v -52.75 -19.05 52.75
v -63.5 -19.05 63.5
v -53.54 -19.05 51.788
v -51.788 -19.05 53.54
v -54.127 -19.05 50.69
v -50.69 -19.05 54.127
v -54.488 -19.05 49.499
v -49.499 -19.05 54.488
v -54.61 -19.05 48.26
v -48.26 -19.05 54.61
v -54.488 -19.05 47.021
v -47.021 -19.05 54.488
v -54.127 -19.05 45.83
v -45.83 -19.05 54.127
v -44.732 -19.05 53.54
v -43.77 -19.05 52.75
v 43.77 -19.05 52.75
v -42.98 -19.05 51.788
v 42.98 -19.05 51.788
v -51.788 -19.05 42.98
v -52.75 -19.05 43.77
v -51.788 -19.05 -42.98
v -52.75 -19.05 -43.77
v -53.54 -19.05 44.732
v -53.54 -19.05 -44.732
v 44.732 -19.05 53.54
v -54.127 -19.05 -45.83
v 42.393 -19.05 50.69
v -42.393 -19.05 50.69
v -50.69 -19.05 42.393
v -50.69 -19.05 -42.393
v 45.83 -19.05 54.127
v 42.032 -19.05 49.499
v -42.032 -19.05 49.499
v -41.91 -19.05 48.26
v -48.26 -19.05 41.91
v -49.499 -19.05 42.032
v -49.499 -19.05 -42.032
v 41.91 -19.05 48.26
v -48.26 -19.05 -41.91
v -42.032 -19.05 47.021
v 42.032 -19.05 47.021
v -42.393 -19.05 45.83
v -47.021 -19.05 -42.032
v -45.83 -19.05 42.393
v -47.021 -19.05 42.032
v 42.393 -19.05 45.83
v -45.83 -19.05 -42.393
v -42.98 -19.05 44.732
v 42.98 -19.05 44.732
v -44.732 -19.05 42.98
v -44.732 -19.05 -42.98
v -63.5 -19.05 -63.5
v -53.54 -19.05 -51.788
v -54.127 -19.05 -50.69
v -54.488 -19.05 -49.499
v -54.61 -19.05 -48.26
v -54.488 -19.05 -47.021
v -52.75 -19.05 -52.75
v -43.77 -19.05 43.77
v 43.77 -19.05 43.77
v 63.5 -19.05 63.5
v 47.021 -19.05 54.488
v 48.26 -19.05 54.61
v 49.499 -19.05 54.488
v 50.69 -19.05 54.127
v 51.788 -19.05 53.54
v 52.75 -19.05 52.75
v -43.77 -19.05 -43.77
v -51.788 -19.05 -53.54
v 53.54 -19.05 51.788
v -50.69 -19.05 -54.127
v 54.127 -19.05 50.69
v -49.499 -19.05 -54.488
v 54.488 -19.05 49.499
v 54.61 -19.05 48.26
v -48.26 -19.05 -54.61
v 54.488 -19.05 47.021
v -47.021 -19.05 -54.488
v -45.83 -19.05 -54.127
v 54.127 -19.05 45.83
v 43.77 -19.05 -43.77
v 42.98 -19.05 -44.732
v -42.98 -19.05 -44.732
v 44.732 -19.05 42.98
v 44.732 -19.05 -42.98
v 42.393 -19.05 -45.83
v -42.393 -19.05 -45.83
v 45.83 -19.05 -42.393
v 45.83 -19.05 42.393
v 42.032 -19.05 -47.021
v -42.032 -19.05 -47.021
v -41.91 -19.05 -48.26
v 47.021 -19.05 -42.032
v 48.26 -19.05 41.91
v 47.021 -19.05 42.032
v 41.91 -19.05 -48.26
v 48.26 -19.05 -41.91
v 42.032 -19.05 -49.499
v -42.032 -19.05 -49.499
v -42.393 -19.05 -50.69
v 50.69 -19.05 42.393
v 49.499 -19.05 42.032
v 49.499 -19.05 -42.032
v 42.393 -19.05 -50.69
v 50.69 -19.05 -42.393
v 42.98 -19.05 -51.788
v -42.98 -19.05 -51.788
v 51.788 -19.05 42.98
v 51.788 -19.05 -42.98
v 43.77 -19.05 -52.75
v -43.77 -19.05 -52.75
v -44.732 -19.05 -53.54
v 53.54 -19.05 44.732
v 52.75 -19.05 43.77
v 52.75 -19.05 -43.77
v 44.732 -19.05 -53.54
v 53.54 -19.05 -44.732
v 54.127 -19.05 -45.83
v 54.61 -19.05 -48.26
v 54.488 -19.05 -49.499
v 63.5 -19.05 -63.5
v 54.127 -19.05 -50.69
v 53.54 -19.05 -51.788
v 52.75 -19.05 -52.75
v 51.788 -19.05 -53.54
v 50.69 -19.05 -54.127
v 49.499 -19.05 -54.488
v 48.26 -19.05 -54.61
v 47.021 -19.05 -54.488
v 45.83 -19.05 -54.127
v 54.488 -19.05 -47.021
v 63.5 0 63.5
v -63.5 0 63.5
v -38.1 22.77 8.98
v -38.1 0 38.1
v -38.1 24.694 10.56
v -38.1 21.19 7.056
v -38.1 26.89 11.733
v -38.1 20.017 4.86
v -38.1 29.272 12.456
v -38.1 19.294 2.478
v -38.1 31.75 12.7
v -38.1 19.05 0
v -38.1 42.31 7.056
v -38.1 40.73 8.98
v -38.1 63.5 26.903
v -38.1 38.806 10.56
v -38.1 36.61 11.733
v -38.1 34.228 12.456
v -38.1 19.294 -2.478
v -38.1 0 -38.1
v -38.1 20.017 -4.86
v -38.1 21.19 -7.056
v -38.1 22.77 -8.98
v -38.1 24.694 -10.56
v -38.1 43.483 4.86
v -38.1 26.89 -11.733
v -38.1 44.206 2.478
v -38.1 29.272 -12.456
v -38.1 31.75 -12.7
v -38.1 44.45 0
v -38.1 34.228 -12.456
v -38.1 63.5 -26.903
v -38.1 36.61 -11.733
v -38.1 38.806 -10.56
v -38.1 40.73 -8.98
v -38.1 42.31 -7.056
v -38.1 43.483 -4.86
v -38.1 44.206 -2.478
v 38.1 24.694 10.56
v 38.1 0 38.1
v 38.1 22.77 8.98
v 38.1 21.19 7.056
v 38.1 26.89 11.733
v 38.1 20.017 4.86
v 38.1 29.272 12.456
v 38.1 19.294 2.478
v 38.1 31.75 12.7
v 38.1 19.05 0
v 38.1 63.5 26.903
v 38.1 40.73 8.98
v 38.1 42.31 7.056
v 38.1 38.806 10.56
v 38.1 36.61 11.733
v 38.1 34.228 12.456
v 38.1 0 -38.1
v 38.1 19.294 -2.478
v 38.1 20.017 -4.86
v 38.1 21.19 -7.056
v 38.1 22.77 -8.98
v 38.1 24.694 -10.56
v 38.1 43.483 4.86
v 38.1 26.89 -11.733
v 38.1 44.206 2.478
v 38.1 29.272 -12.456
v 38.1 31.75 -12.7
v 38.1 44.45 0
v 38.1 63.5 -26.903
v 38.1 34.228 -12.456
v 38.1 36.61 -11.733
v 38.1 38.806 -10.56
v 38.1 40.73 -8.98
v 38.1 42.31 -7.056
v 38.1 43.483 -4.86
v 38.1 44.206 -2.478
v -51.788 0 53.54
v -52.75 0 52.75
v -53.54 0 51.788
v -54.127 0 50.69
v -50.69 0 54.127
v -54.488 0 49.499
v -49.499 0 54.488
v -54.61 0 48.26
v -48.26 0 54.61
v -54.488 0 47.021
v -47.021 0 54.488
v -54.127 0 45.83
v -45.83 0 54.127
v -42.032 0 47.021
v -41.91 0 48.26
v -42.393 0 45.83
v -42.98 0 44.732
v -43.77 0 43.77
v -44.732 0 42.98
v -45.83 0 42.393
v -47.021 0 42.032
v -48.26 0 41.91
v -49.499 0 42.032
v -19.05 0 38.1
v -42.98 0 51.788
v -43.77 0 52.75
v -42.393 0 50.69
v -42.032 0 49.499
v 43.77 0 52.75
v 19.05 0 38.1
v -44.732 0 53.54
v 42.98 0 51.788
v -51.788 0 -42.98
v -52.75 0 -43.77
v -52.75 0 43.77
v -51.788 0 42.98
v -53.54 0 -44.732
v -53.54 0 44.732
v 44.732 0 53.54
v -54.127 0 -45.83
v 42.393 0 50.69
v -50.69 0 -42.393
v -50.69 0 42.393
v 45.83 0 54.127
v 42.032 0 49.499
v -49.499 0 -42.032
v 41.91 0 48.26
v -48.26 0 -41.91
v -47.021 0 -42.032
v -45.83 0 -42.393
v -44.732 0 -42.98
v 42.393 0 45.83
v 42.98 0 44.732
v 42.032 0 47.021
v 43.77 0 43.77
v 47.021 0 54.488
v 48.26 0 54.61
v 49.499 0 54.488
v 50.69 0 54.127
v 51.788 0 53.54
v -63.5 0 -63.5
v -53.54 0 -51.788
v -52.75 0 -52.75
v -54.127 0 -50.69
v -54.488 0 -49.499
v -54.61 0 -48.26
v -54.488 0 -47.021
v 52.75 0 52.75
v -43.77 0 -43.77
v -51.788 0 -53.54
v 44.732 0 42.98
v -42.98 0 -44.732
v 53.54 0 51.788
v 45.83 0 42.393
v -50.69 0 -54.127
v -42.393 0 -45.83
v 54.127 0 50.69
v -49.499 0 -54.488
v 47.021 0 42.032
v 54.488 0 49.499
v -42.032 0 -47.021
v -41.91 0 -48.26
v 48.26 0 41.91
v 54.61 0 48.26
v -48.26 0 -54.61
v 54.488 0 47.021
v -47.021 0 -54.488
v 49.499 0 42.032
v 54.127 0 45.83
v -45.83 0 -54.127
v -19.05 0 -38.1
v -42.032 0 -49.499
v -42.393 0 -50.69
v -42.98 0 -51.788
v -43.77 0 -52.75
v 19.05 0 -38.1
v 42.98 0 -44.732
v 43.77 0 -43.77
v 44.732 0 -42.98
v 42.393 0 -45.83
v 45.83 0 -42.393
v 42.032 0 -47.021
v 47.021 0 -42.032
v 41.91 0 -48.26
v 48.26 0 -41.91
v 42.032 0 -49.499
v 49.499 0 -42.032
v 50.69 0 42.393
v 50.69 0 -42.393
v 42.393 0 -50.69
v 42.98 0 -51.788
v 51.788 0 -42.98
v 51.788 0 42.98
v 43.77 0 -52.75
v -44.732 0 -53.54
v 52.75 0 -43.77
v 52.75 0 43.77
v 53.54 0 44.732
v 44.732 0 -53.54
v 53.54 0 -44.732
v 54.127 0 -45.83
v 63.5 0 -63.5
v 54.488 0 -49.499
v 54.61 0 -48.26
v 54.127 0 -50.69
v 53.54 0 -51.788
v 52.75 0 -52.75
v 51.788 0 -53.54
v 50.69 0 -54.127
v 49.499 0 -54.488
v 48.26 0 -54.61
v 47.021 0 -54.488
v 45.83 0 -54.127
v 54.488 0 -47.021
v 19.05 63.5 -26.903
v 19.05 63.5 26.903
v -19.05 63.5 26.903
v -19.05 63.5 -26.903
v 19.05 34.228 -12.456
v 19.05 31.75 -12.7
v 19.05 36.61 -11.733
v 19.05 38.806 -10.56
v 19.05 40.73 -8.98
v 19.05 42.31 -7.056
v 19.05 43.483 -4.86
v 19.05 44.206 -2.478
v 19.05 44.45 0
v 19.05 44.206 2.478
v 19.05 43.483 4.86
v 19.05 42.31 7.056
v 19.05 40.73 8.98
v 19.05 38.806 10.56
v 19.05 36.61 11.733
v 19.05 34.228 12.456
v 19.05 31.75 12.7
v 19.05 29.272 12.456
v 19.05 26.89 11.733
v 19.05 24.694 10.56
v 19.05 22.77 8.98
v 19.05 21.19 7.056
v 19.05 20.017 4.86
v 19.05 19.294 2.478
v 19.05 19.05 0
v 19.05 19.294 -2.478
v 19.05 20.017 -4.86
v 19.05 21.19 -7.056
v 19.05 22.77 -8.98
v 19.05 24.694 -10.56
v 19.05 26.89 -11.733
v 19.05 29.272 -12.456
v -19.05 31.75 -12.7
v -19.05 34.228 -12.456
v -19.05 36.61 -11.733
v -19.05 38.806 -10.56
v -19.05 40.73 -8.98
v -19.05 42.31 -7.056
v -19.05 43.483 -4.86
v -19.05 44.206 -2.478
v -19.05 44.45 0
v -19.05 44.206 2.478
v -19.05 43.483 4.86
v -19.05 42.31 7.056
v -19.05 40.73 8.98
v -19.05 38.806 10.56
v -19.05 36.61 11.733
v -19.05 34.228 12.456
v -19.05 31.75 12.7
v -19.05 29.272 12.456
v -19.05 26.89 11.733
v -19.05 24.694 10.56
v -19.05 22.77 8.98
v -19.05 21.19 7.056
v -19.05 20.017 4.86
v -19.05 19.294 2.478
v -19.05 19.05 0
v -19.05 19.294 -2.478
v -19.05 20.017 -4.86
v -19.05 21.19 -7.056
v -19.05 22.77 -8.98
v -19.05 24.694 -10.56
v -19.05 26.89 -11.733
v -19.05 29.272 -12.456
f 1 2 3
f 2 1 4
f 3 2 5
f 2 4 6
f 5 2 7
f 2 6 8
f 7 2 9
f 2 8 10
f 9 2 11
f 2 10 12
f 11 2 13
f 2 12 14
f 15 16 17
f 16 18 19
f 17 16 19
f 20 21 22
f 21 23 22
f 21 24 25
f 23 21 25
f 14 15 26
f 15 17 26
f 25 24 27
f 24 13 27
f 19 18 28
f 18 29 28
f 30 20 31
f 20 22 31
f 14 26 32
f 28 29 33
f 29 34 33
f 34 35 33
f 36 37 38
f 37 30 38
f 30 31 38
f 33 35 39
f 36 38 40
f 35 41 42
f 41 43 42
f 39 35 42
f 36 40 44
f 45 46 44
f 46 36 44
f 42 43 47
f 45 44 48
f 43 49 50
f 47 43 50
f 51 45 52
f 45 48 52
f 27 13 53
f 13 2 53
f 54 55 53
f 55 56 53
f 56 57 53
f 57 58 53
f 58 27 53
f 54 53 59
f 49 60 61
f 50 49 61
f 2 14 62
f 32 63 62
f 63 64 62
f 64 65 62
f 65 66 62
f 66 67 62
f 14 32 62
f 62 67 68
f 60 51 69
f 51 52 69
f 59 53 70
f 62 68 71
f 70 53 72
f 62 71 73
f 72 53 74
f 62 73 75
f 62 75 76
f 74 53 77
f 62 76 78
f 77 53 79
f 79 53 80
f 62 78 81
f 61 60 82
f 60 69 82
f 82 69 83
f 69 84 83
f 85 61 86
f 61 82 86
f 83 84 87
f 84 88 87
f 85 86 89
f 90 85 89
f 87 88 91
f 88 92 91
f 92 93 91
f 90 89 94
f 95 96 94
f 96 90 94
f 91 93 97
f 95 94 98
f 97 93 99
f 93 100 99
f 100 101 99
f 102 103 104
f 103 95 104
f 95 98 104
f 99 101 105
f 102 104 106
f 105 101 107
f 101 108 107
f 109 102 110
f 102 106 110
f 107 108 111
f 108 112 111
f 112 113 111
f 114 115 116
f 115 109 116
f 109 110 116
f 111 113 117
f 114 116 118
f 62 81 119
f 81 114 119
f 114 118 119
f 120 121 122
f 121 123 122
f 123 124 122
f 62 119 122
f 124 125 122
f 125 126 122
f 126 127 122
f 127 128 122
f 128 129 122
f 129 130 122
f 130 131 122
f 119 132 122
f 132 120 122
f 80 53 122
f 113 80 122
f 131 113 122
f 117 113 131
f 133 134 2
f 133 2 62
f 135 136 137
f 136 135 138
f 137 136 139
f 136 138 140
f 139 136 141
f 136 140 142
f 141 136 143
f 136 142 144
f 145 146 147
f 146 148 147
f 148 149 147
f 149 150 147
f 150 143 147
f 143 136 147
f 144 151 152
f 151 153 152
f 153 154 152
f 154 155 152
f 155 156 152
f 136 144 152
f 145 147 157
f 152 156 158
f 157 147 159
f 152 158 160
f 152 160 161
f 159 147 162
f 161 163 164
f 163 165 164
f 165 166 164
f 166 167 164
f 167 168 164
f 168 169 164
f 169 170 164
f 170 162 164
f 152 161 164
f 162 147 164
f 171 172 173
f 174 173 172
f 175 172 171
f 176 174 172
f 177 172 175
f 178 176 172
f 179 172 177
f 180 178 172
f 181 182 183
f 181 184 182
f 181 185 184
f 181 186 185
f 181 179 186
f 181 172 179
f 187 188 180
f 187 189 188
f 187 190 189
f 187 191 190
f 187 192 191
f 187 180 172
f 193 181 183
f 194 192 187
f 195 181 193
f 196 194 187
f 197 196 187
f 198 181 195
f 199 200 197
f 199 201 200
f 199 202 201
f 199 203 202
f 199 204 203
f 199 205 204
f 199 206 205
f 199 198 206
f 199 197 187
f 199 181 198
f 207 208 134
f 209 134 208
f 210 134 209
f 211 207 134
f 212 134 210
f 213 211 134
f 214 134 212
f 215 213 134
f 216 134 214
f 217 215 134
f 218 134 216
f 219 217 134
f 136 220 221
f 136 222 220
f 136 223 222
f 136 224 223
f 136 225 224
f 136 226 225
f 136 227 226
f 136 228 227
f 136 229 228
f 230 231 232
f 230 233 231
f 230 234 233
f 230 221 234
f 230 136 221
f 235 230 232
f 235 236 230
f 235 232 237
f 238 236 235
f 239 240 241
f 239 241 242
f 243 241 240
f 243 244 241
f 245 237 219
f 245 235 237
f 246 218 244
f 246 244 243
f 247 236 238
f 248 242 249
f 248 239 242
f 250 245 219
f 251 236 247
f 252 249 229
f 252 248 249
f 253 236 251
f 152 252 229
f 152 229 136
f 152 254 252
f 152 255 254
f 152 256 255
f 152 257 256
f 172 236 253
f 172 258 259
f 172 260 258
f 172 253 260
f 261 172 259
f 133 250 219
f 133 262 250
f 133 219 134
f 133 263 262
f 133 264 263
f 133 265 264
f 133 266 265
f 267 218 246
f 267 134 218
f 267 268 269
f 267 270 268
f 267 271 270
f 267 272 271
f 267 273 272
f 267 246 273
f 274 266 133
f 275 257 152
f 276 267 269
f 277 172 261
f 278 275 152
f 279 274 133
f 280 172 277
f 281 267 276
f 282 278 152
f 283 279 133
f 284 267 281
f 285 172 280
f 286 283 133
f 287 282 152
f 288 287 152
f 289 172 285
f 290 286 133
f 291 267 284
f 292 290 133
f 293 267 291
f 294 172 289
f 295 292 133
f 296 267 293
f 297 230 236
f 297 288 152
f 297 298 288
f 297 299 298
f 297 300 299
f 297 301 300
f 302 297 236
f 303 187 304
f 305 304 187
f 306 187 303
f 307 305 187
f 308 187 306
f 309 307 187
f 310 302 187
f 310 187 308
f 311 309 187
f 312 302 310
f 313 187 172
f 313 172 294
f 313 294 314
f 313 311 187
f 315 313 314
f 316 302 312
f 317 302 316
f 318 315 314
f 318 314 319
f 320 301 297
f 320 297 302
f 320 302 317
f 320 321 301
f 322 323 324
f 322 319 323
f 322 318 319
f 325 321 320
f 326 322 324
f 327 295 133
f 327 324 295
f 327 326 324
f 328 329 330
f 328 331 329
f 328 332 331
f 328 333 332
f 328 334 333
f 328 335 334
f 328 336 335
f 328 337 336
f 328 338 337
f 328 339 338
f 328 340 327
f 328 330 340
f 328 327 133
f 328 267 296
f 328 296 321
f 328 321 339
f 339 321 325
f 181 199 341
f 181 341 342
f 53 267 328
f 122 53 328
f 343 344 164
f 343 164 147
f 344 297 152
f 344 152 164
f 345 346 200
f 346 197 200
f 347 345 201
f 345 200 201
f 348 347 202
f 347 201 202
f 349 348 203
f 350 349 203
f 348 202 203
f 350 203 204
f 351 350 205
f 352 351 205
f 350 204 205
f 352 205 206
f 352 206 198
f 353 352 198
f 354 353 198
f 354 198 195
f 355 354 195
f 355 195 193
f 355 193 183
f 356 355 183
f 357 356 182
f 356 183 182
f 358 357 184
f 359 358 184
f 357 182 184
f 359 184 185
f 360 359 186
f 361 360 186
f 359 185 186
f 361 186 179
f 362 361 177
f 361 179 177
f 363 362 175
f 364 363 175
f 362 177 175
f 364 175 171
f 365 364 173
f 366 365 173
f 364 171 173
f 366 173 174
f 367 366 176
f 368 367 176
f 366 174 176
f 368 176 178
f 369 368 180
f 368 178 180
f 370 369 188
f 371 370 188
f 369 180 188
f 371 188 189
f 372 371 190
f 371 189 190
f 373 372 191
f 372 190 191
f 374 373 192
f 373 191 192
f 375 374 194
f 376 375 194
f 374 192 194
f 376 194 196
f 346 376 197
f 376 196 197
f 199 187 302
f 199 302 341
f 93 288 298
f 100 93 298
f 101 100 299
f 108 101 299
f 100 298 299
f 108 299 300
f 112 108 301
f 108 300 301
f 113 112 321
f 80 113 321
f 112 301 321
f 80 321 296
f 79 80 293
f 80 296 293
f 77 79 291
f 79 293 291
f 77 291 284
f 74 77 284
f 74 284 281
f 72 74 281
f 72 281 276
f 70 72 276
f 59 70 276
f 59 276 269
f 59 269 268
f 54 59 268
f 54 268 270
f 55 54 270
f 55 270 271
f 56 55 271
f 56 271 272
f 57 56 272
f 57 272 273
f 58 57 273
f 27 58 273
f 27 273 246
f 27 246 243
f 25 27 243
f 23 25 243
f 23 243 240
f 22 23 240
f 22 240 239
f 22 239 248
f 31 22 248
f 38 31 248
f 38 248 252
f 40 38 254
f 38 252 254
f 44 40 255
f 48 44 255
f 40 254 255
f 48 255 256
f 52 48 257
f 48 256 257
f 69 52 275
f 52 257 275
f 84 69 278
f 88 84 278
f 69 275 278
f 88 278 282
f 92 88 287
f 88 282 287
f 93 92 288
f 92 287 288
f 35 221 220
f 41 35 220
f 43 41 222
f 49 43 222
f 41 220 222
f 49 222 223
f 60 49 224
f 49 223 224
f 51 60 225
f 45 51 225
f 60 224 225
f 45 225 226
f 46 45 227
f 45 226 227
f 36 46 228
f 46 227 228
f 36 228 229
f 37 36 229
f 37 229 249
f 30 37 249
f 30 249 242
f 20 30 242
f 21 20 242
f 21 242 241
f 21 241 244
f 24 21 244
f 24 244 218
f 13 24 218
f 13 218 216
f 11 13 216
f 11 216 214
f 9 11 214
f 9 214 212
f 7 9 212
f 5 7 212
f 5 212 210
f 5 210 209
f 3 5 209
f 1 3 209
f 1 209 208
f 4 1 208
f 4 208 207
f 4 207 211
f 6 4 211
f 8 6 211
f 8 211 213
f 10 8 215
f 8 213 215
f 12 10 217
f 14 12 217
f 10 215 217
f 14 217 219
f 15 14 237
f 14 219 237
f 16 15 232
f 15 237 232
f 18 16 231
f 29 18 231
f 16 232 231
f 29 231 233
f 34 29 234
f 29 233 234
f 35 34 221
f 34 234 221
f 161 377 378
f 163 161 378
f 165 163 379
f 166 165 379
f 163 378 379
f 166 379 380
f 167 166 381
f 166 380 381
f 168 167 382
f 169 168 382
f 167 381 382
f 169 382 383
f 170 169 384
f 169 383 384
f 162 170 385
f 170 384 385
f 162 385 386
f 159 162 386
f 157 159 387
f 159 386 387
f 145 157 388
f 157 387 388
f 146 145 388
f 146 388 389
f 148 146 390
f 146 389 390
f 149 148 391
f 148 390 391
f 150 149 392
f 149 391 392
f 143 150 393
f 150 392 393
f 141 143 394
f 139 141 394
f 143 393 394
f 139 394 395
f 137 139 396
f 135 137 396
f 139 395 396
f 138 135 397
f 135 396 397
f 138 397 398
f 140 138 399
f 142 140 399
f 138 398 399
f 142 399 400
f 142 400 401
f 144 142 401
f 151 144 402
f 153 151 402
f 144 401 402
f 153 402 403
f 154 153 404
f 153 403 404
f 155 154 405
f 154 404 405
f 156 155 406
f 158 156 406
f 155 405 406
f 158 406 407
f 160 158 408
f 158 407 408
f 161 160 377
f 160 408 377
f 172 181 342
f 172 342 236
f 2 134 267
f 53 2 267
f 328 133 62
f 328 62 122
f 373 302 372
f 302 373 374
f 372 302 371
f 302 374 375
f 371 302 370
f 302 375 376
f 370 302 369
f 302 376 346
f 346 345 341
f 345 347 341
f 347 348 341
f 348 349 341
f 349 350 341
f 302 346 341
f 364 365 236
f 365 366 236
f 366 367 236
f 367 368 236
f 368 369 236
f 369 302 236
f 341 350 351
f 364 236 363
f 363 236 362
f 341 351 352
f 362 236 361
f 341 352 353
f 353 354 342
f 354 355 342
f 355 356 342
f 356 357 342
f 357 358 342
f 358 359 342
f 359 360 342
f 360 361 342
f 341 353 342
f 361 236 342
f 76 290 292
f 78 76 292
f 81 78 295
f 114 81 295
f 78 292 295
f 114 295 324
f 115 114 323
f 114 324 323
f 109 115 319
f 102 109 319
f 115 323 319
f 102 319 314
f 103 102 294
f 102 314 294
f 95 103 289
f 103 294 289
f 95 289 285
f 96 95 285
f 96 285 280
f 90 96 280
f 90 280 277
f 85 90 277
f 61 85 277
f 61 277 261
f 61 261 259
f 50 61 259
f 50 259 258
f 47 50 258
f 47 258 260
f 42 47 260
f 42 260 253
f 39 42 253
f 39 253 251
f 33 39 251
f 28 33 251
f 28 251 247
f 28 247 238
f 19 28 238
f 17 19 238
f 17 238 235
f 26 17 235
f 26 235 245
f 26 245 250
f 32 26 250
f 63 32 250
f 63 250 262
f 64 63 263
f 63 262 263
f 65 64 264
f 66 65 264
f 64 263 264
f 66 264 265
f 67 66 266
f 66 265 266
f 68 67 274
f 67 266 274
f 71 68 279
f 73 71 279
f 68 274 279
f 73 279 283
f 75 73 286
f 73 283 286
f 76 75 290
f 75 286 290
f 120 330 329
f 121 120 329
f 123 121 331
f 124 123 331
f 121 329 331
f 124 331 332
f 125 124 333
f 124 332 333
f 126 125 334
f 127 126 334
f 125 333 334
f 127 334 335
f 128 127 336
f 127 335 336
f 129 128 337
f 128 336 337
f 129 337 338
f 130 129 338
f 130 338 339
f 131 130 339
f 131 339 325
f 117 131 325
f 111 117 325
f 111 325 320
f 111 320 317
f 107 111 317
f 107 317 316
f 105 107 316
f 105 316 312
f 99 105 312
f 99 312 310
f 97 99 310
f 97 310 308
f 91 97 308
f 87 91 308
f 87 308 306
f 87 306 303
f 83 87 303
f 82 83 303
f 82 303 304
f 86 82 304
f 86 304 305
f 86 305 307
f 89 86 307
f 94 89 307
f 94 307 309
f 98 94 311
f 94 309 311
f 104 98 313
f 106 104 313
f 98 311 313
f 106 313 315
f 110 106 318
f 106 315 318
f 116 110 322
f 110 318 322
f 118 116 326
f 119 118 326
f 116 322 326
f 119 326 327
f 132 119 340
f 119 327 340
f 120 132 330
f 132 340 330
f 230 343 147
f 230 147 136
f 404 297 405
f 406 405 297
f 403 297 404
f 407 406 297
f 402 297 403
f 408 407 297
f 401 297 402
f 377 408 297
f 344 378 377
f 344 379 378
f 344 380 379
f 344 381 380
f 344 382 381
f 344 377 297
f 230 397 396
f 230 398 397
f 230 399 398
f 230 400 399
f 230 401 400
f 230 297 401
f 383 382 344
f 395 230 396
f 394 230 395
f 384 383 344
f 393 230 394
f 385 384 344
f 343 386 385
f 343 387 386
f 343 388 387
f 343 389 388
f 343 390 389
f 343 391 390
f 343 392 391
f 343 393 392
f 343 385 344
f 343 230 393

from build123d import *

# Parameters (mm, degrees)
SKETCH1_W          = 127
SKETCH1_H          = 127
EXTRUDE1_DEPTH     = 19.05
EXTRUDE2_DEPTH     = 38.1
SKETCH3_R          = 12.7
CUT_EXTRUDE1_DEPTH = 38.1
SKETCH4_W          = 38.1
SKETCH4_H          = 63.5
CUT_EXTRUDE2_DEPTH = 38.1
CUT_EXTRUDE3_REACH = 21.05
SKETCH5_R          = 6.35
CUT_EXTRUDE4_REACH = 21.05
SKETCH6_R          = 6.35
CUT_EXTRUDE5_REACH = 21.05
SKETCH8_R          = 6.35


with BuildPart() as part:
    # Sketch1 → Extrude1 (new body)
    with BuildSketch(Plane(origin=(0, 0, 0), x_dir=(1, 0, 0), z_dir=(0, 1, 0))):
        Rectangle(SKETCH1_W, SKETCH1_H)
    extrude(amount=-EXTRUDE1_DEPTH)

    # Sketch2 → Extrude2 (add, symmetric)
    with BuildSketch(Plane(origin=(0, 0, 0), x_dir=(0, 0, -1), z_dir=(1, 0, 0))):
        Polygon((38.1, 0), (26.903236725, 63.5), (-26.903236725, 63.5), (-38.1, 0), align=None)
    extrude(amount=EXTRUDE2_DEPTH, both=True)

    # Sketch3 → Cut-Extrude1 (cut, symmetric)
    with BuildSketch(Plane(origin=(0, 0, 0), x_dir=(0, 0, -1), z_dir=(1, 0, 0))):
        with Locations((0, 31.75)):
            Circle(SKETCH3_R)
    extrude(amount=CUT_EXTRUDE1_DEPTH, both=True, mode=Mode.SUBTRACT)

    # Sketch4 → Cut-Extrude2 (cut, symmetric)
    with BuildSketch(Plane.XY):
        with Locations((0, 31.75)):
            Rectangle(SKETCH4_W, SKETCH4_H)
    extrude(amount=CUT_EXTRUDE2_DEPTH, both=True, mode=Mode.SUBTRACT)

    # Sketch5 → Cut-Extrude3 (cut, up to next)
    with BuildSketch(Plane(origin=(0, 0, 0), x_dir=(1, 0, 0), z_dir=(0, 1, 0)), mode=Mode.PRIVATE) as cut_extrude3_sk1:
        with Locations((-48.26, 48.26)):
            Circle(SKETCH5_R)
    cut_extrude3_tool1 = extrude(cut_extrude3_sk1.sketch, amount=-CUT_EXTRUDE3_REACH, mode=Mode.PRIVATE) & part.part
    add(cut_extrude3_tool1.solids().sort_by_distance((-48.26, 0, -48.26))[0], mode=Mode.SUBTRACT)

    # Sketch6 → Cut-Extrude4 (cut, up to next)
    with BuildSketch(Plane(origin=(0, 0, 0), x_dir=(1, 0, 0), z_dir=(0, 1, 0)), mode=Mode.PRIVATE) as cut_extrude4_sk1:
        with Locations((48.26, 48.26)):
            Circle(SKETCH6_R)
    cut_extrude4_tool1 = extrude(cut_extrude4_sk1.sketch, amount=-CUT_EXTRUDE4_REACH, mode=Mode.PRIVATE) & part.part
    add(cut_extrude4_tool1.solids().sort_by_distance((48.26, 0, -48.26))[0], mode=Mode.SUBTRACT)

    # Sketch8 → Cut-Extrude5 (cut, up to next)
    with BuildSketch(Plane(origin=(0, 0, 0), x_dir=(1, 0, 0), z_dir=(0, 1, 0)), mode=Mode.PRIVATE) as cut_extrude5_sk1:
        with Locations((-48.26, -48.26)):
            Circle(SKETCH8_R)
    cut_extrude5_tool1 = extrude(cut_extrude5_sk1.sketch, amount=-CUT_EXTRUDE5_REACH, mode=Mode.PRIVATE) & part.part
    add(cut_extrude5_tool1.solids().sort_by_distance((-48.26, 0, 48.26))[0], mode=Mode.SUBTRACT)
    # Sketch8 → Cut-Extrude5 (cut, up to next)
    with BuildSketch(Plane(origin=(0, 0, 0), x_dir=(1, 0, 0), z_dir=(0, 1, 0)), mode=Mode.PRIVATE) as cut_extrude5_sk2:
        with Locations((48.26, -48.26)):
            Circle(SKETCH8_R)
    cut_extrude5_tool2 = extrude(cut_extrude5_sk2.sketch, amount=-CUT_EXTRUDE5_REACH, mode=Mode.PRIVATE) & part.part
    add(cut_extrude5_tool2.solids().sort_by_distance((48.26, 0, 48.26))[0], mode=Mode.SUBTRACT)


solid = part.part
